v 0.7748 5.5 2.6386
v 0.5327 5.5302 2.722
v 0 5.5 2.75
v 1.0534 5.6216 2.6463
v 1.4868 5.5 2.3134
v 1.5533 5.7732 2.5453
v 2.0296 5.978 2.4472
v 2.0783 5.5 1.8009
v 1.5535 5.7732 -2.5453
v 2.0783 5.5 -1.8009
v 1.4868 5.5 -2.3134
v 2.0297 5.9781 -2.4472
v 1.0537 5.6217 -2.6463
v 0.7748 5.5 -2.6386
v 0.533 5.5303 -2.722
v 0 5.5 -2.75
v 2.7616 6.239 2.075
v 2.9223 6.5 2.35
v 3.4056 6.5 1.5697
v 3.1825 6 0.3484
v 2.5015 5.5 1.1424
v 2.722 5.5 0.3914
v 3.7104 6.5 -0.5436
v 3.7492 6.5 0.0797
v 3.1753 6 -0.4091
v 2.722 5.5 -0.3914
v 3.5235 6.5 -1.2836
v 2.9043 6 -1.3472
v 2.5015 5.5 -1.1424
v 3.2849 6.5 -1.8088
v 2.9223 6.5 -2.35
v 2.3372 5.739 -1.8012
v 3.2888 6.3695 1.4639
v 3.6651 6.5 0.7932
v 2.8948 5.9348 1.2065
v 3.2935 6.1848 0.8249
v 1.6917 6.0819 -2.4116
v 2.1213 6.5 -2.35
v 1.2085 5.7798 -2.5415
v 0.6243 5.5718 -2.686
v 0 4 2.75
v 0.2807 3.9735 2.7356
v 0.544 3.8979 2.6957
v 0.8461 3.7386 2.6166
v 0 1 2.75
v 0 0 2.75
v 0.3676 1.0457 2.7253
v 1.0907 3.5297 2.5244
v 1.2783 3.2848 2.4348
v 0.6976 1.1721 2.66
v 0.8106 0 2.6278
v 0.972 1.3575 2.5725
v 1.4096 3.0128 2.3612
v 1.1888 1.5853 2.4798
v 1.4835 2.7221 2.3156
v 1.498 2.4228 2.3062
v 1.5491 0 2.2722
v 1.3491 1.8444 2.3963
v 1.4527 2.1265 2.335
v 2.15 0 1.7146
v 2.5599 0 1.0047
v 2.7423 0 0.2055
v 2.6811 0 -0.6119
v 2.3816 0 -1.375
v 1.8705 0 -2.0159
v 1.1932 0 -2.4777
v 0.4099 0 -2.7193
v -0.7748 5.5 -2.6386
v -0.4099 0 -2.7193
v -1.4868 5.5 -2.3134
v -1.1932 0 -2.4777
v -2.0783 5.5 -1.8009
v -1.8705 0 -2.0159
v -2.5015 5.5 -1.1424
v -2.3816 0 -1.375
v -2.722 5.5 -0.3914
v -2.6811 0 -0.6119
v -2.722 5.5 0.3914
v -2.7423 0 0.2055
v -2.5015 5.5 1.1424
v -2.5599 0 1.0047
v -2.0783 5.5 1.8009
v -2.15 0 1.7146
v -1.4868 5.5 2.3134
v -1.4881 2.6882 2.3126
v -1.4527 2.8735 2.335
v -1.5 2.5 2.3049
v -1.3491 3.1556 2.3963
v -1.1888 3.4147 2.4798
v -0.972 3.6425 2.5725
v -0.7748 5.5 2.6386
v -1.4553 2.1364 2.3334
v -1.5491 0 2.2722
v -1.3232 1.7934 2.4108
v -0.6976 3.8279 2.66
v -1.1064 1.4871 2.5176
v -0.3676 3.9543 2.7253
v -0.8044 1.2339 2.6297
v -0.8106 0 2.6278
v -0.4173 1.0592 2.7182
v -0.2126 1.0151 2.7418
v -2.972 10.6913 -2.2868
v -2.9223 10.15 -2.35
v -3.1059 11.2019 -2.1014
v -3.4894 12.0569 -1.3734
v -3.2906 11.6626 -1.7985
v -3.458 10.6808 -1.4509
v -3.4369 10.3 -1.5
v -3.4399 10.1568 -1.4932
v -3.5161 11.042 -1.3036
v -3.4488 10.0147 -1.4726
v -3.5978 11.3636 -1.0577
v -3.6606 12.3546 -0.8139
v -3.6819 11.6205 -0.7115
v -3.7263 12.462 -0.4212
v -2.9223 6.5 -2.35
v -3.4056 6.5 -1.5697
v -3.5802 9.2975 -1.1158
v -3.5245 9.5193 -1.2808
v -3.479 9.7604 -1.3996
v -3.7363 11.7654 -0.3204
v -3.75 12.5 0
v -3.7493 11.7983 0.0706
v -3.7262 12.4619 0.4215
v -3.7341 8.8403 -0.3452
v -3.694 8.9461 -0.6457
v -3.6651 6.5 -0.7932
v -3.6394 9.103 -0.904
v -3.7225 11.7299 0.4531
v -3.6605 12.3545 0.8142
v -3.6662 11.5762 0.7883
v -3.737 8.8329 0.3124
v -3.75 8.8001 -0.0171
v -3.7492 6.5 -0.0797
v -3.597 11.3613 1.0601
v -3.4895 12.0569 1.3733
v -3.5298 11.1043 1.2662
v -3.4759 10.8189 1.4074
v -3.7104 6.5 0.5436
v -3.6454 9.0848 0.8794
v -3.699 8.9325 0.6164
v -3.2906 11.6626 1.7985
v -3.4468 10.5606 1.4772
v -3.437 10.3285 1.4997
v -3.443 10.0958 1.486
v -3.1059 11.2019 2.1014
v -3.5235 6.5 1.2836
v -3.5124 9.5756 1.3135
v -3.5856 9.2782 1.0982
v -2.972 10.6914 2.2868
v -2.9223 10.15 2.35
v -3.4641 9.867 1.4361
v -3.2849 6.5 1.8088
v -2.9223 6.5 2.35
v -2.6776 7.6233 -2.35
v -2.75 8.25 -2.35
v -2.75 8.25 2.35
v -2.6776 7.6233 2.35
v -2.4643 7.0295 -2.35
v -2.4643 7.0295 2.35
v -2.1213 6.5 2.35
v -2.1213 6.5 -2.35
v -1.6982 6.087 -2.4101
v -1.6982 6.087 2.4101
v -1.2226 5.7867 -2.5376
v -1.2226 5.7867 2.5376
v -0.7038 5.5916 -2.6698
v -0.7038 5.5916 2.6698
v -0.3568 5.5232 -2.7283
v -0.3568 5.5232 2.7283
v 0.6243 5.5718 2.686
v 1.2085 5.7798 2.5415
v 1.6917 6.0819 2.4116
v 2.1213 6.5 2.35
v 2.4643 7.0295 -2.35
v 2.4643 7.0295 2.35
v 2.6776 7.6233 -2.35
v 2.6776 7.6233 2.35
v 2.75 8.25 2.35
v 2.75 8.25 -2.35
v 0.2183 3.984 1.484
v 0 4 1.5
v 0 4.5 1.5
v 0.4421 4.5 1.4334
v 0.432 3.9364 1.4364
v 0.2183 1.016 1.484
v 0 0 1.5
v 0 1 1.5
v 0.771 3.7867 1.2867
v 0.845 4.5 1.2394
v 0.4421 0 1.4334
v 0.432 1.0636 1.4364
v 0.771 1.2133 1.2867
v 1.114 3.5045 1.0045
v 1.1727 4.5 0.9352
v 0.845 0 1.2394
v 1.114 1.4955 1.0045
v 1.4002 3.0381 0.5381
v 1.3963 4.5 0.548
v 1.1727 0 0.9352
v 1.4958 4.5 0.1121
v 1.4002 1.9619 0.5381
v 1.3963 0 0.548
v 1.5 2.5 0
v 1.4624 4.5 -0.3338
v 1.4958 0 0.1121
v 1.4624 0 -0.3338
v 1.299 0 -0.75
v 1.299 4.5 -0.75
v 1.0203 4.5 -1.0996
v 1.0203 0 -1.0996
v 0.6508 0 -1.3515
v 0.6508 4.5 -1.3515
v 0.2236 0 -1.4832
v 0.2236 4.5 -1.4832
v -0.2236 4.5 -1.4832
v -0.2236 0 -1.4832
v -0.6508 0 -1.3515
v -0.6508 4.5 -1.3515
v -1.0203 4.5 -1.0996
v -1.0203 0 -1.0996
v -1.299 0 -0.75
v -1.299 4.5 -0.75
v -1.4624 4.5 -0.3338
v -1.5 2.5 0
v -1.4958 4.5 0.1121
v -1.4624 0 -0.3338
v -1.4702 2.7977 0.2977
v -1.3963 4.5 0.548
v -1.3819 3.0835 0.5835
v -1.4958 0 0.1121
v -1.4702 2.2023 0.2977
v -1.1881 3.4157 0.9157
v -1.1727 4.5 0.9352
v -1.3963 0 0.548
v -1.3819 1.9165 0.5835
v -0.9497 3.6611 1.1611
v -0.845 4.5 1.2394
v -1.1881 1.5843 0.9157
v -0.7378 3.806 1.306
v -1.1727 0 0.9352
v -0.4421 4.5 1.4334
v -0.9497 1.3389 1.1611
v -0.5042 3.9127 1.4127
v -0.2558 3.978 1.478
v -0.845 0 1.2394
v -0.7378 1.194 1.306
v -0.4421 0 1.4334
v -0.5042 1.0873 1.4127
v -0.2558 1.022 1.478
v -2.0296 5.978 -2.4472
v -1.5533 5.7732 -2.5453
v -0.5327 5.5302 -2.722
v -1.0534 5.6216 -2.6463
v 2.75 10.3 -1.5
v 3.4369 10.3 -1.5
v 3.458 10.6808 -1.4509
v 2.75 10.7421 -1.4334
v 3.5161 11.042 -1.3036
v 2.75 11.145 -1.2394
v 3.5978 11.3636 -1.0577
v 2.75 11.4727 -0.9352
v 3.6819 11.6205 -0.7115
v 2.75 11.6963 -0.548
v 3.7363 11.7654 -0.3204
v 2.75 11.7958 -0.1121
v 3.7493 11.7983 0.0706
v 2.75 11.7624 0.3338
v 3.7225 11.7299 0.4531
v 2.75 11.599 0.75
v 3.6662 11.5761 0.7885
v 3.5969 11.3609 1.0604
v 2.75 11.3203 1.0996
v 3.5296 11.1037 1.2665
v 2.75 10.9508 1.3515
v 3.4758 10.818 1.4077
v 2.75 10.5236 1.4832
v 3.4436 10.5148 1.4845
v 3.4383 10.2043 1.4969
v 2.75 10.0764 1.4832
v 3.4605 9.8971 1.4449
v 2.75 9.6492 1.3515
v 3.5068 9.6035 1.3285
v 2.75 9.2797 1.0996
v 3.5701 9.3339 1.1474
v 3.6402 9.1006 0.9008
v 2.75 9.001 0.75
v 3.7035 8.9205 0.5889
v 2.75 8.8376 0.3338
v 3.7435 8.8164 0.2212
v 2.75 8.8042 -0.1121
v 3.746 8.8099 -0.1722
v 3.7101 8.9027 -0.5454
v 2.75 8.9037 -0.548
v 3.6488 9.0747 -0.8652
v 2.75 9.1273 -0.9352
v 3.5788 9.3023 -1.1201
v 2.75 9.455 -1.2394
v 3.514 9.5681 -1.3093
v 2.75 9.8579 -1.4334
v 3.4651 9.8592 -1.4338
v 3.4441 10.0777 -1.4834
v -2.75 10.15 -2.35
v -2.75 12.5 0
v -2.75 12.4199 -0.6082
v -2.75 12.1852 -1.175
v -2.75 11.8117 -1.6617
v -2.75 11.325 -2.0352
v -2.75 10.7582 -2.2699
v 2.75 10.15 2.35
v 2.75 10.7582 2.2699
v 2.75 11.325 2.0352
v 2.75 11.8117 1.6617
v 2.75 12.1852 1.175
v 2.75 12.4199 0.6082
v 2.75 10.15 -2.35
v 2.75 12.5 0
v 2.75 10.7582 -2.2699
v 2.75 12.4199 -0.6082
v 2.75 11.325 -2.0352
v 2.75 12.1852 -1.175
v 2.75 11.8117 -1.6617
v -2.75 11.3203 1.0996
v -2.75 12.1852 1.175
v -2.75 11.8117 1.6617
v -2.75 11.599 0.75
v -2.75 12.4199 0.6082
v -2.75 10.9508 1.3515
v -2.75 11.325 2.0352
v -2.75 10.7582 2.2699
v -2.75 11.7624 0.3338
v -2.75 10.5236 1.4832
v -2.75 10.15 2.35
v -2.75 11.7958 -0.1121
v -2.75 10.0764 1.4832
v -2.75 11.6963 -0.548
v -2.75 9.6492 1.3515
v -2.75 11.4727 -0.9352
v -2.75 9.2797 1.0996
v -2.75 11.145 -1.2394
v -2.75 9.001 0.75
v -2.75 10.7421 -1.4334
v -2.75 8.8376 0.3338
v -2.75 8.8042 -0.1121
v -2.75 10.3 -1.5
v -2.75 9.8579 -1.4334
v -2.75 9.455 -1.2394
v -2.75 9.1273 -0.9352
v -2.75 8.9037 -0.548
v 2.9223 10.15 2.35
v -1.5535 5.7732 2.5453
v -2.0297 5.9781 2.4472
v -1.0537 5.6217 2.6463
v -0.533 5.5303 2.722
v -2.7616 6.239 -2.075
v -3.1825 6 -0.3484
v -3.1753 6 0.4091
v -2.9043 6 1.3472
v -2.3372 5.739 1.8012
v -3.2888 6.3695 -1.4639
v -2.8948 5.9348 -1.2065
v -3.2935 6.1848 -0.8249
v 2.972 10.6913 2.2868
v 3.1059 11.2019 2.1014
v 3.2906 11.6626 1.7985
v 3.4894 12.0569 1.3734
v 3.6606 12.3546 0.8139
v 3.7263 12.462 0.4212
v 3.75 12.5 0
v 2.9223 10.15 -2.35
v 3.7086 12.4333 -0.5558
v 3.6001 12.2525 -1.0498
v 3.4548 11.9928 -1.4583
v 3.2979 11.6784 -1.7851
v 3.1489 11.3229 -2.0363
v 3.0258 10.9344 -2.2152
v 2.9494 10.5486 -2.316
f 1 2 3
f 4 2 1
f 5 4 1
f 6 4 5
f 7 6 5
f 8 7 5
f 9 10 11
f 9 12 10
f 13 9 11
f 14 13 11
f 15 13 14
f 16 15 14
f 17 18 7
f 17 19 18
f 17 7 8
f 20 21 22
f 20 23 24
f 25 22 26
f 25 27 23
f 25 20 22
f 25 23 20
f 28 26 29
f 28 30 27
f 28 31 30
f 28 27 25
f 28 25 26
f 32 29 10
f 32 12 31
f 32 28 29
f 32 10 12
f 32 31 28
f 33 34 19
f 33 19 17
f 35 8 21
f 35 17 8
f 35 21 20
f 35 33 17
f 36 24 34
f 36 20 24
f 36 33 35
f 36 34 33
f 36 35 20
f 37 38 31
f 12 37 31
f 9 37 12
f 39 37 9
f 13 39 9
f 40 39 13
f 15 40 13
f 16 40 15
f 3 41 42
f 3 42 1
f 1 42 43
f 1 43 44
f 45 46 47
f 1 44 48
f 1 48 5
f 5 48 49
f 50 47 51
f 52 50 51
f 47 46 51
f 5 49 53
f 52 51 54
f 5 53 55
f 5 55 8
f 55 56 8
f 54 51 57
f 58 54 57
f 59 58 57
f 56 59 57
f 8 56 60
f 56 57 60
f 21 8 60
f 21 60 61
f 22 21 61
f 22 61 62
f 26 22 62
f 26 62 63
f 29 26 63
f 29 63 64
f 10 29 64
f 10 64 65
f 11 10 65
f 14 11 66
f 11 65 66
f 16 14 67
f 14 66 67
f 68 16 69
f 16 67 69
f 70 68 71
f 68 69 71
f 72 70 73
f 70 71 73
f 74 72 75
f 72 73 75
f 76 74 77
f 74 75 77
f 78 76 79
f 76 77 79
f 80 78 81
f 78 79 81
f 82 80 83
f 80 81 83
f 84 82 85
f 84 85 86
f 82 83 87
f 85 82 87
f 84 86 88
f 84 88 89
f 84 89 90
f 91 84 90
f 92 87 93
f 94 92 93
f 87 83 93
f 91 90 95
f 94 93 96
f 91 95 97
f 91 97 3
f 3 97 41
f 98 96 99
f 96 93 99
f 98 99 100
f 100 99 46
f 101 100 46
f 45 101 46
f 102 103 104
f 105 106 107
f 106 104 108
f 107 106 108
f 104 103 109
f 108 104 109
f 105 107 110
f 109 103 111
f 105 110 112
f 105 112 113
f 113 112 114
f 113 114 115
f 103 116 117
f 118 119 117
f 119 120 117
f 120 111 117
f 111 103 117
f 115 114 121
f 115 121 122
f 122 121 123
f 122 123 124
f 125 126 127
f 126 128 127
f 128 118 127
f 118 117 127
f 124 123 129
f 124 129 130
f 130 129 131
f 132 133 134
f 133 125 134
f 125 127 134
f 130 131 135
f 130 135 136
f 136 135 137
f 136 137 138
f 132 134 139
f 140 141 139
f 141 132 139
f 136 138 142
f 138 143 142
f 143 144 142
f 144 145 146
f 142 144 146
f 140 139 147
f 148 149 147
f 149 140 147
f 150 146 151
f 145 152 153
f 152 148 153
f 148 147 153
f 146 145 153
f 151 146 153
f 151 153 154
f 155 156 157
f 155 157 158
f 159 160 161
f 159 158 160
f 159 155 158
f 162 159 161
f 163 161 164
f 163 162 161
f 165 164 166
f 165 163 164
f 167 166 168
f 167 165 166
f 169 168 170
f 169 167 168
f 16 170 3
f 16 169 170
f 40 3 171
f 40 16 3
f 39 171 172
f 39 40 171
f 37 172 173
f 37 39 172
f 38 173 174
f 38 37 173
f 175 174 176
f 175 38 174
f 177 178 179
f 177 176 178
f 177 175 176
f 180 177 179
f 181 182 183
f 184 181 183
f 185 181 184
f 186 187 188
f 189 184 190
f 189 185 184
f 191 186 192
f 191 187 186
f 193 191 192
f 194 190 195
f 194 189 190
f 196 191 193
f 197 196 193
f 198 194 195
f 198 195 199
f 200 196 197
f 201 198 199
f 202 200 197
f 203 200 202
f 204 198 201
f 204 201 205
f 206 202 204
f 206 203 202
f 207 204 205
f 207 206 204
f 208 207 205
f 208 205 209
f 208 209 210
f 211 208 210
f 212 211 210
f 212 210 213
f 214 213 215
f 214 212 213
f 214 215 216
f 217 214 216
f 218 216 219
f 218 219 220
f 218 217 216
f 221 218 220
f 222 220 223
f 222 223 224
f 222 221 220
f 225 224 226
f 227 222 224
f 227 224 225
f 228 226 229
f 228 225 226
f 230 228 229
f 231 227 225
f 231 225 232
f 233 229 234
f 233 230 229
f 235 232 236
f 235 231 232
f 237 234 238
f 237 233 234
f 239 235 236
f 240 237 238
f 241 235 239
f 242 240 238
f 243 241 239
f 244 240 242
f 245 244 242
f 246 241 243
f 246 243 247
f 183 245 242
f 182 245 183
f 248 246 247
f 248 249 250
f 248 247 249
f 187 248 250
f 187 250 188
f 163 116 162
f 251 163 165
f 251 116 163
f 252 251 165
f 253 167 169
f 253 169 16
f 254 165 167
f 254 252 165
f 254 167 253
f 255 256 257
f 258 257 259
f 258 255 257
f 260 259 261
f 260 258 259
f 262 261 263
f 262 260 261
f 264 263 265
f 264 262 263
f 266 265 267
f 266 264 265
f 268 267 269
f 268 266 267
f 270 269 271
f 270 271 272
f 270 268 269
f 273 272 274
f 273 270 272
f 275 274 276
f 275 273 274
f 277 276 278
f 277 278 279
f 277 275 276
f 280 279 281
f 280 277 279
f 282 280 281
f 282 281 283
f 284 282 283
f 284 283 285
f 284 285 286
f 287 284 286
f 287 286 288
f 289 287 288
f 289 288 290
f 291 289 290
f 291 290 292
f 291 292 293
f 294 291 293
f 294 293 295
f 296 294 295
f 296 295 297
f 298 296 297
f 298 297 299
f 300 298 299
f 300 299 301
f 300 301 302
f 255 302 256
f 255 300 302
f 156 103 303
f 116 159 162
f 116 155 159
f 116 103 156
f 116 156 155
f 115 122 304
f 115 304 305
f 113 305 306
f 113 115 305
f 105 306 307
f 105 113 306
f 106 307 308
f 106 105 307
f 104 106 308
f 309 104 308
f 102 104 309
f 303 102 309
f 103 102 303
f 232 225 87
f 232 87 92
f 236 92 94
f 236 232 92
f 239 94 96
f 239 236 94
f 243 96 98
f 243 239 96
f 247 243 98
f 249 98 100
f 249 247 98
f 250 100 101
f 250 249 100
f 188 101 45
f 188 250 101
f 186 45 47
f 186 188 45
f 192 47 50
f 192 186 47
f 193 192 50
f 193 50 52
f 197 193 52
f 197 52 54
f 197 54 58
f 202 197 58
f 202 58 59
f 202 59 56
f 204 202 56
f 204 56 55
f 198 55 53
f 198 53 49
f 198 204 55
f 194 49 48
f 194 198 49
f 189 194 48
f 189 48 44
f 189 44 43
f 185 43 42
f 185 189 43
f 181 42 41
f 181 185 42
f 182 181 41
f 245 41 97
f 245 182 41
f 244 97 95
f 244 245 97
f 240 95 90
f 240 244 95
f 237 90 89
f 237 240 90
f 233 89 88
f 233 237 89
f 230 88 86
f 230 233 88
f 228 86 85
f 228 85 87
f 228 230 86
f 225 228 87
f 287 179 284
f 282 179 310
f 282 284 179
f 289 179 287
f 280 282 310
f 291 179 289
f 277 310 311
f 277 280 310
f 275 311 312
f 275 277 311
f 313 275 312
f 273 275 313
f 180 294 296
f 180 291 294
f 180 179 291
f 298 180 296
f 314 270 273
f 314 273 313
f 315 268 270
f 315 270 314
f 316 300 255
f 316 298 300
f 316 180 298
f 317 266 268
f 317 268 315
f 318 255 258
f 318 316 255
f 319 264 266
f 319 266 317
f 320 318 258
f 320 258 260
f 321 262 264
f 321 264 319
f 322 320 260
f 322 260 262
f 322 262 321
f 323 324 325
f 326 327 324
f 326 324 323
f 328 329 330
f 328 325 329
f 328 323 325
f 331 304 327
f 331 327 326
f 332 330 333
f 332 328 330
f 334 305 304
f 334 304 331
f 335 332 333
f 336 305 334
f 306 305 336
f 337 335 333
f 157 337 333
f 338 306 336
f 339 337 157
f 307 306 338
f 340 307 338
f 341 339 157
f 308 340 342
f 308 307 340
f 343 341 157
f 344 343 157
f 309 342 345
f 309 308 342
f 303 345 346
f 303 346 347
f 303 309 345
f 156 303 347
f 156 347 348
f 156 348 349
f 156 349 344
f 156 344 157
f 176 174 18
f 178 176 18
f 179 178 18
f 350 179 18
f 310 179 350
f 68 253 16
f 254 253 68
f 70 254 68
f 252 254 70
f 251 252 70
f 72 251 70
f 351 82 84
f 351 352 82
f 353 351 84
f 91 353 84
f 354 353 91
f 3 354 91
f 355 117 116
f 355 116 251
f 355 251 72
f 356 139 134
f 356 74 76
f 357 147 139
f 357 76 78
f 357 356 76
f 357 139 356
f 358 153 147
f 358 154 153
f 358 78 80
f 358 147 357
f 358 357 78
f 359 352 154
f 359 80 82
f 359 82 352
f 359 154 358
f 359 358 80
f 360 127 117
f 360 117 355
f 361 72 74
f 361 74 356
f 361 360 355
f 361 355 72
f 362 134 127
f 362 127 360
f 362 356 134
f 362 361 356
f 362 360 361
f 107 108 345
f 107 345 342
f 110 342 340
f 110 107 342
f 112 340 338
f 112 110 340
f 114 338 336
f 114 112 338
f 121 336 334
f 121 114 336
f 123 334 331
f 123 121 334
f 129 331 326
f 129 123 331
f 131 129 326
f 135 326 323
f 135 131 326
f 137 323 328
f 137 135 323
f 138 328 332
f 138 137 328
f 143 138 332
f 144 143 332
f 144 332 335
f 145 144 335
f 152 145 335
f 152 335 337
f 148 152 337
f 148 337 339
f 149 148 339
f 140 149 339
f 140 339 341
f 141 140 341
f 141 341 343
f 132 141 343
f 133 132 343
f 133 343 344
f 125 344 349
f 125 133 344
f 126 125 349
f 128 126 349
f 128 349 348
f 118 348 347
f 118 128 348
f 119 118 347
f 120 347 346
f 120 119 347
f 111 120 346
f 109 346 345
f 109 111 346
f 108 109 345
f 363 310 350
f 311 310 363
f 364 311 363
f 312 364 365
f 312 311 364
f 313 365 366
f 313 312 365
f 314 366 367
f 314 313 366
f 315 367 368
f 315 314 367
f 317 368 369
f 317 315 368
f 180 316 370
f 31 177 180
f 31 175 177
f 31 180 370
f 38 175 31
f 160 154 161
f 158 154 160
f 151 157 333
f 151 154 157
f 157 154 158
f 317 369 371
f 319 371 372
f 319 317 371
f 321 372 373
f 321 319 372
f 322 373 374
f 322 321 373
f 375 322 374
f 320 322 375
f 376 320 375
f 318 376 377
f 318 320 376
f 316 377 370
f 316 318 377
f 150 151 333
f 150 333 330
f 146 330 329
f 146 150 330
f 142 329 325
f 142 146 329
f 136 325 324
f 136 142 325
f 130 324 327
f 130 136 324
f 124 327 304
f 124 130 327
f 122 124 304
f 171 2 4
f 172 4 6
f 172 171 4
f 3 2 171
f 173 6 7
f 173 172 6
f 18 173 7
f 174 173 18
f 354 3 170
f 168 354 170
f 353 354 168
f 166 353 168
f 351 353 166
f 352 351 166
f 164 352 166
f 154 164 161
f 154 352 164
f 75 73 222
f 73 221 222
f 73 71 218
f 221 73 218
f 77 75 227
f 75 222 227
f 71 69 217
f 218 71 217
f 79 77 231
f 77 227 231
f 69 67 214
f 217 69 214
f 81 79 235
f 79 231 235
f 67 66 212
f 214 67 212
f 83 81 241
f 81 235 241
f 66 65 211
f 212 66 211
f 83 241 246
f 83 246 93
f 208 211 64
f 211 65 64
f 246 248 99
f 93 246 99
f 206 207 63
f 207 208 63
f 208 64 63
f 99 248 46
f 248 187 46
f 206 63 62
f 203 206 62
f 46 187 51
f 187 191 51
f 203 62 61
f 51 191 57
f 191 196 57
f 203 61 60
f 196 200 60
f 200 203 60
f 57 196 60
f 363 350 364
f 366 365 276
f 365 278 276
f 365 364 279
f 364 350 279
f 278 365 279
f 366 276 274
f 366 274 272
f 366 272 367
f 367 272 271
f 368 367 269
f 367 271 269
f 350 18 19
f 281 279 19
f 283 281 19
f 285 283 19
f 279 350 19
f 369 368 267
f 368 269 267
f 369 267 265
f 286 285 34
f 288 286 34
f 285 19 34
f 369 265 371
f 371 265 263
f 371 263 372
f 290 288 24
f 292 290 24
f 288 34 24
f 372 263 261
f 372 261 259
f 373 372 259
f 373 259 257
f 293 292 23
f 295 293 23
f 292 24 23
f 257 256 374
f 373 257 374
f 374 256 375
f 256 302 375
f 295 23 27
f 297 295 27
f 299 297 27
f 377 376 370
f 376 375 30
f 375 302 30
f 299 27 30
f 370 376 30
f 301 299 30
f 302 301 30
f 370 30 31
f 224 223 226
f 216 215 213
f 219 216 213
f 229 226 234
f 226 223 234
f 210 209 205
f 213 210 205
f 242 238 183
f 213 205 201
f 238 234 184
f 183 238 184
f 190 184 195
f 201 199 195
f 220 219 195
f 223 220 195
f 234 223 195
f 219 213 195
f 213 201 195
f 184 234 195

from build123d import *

# Parameters (mm, degrees)
SKETCH1_R               = 2.75
SKETCH1_R_2             = 1.5
BOSS_EXTRUDE1_DEPTH     = 4.5
SKETCH2_R               = 2.75
BOSS_EXTRUDE2_DEPTH     = 1
SKETCH4_R               = 3.75
BOSS_EXTRUDE3_DEPTH     = 6
CUT_EXTRUDE2_DEPTH      = 14.578475761
CUT_EXTRUDE2_DEPTH_BACK = 14.578475761
CUT_EXTRUDE3_DEPTH      = 14.336978811
CUT_EXTRUDE3_DEPTH_BACK = 14.336978811
CUT_EXTRUDE4_DEPTH      = 14.336978811
CUT_EXTRUDE4_DEPTH_BACK = 14.336978811
SKETCH7_R               = 1.5
SKETCH9_R               = 1.5
CUT_EXTRUDE5_DEPTH      = 14.336978811


with BuildPart() as part:
    # Sketch1 → Boss-Extrude1 (new body)
    with BuildSketch(Plane(origin=(0, 0, 0), x_dir=(1, 0, 0), z_dir=(0, 1, 0))):
        with Locations(Location((0, 0, 0), (0, 0, 270))):
            Circle(SKETCH1_R)
        with Locations(Location((0, 0, 0), (0, 0, 270))):
            Circle(SKETCH1_R_2, mode=Mode.SUBTRACT)
    extrude(amount=BOSS_EXTRUDE1_DEPTH)

    # Sketch2 → Boss-Extrude2 (add)
    with BuildSketch(Plane(origin=(0, 4.5, 0), x_dir=(1, 0, 0), z_dir=(0, 1, 0))):
        with Locations(Location((0, 0, 0), (0, 0, 270))):
            Circle(SKETCH2_R)
    extrude(amount=BOSS_EXTRUDE2_DEPTH)

    # Loft1: read off the stored shape, not the designer's step
    # Loft1: loft between two sections, ruled curve by curve
    loft1_from = [
        Edge.make_bspline([(-2.7249459, 5.5, -0.370364471), (-3.465674842, 5.5, 5.079527329), (1.984216958, 5.5, 5.820256271), (2.7249459, 5.5, 0.370364471), (3.465674842, 5.5, -5.079527329), (-1.984216958, 5.5, -5.820256271), (-2.7249459, 5.5, -0.370364471)], [0, 0, 0, 0, 0.5, 0.5, 0.5, 1, 1, 1, 1], 3, [1, 0.333333333, 0.333333333, 1, 0.333333333, 0.333333333, 1]),
    ]
    loft1_to = [
        Edge.make_bspline([(-3.66375351, 6.5, 0.799631301), (-2.064490908, 6.5, 8.127138321), (5.263016112, 6.5, 6.527875719), (3.66375351, 6.5, -0.799631301), (2.064490908, 6.5, -8.127138321), (-5.263016112, 6.5, -6.527875719), (-3.66375351, 6.5, 0.799631301)], [0, 0, 0, 0, 0.5, 0.5, 0.5, 1, 1, 1, 1], 3, [1, 0.333333333, 0.333333333, 1, 0.333333333, 0.333333333, 1]),
    ]
    loft1 = Solid(Shell([*[Face.make_surface_from_curves(loft1_from[k], loft1_to[k]) for k in range(1)], Face(Wire(loft1_from)), Face(Wire(loft1_to))]))
    add(loft1)

    # Sketch4 → Boss-Extrude3 (add)
    with BuildSketch(Plane(origin=(0, 6.5, 0), x_dir=(1, 0, 0), z_dir=(0, 1, 0))):
        with Locations(Location((0, 0, 0), (0, 0, 192.312))):
            Circle(SKETCH4_R)
    extrude(amount=BOSS_EXTRUDE3_DEPTH)

    # Sketch5 → Cut-Extrude2 (cut, two sides: drawn at the far end of the back side and taken through both)
    with BuildSketch(Plane(origin=(0, 0, 0), x_dir=(0, 0, -1), z_dir=(1, 0, 0)).offset(-CUT_EXTRUDE2_DEPTH_BACK)):
        with BuildLine():
            Line((2.35, 10.15), (2.35, 6.5))
            ThreePointArc((2.35, 6.5), (2.453708798, 5.961483519), (2.75, 5.5))
            Line((2.75, 5.5), (3.75, 6.5))
            Line((3.75, 6.5), (3.75, 12.5))
            Line((3.75, 12.5), (0, 12.5))
            ThreePointArc((0, 12.5), (1.661700936, 11.811700936), (2.35, 10.15))
        make_face()
        with BuildLine():
            ThreePointArc((-2.35, 10.15), (-1.661700936, 11.811700936), (0, 12.5))
            Line((0, 12.5), (-3.75, 12.5))
            Line((-3.75, 12.5), (-3.75, 6.5))
            Line((-3.75, 6.5), (-2.75, 5.5))
            ThreePointArc((-2.75, 5.5), (-2.453708798, 5.961483519), (-2.35, 6.5))
            Line((-2.35, 6.5), (-2.35, 10.15))
        make_face()
    extrude(amount=CUT_EXTRUDE2_DEPTH + CUT_EXTRUDE2_DEPTH_BACK, mode=Mode.SUBTRACT)

    # Sketch6 → Cut-Extrude3 (cut, two sides: drawn at the far end of the back side and taken through both)
    with BuildSketch(Plane.XY.offset(-CUT_EXTRUDE3_DEPTH_BACK)):
        with BuildLine():
            Line((2.75, 8.25), (2.75, 12.5))
            Line((2.75, 12.5), (-2.75, 12.5))
            Line((-2.75, 12.5), (-2.75, 8.25))
            ThreePointArc((-2.75, 8.25), (0, 5.5), (2.75, 8.25))
        make_face()
    extrude(amount=CUT_EXTRUDE3_DEPTH + CUT_EXTRUDE3_DEPTH_BACK, mode=Mode.SUBTRACT)

    # Sketch7 → Cut-Extrude4 (cut, two sides: drawn at the far end of the back side and taken through both)
    with BuildSketch(Plane(origin=(0, 0, 0), x_dir=(0, 0, -1), z_dir=(1, 0, 0)).offset(-CUT_EXTRUDE4_DEPTH_BACK)):
        with Locations((0, 10.3)):
            Circle(SKETCH7_R)
    extrude(amount=CUT_EXTRUDE4_DEPTH + CUT_EXTRUDE4_DEPTH_BACK, mode=Mode.SUBTRACT)

    # Sketch9 → Cut-Extrude5 (cut, through all)
    with BuildSketch(Plane.XY):
        with Locations(Location((0, 2.5, 0), (0, 0, 180))):
            Circle(SKETCH9_R)
    extrude(amount=CUT_EXTRUDE5_DEPTH, mode=Mode.SUBTRACT)


solid = part.part
